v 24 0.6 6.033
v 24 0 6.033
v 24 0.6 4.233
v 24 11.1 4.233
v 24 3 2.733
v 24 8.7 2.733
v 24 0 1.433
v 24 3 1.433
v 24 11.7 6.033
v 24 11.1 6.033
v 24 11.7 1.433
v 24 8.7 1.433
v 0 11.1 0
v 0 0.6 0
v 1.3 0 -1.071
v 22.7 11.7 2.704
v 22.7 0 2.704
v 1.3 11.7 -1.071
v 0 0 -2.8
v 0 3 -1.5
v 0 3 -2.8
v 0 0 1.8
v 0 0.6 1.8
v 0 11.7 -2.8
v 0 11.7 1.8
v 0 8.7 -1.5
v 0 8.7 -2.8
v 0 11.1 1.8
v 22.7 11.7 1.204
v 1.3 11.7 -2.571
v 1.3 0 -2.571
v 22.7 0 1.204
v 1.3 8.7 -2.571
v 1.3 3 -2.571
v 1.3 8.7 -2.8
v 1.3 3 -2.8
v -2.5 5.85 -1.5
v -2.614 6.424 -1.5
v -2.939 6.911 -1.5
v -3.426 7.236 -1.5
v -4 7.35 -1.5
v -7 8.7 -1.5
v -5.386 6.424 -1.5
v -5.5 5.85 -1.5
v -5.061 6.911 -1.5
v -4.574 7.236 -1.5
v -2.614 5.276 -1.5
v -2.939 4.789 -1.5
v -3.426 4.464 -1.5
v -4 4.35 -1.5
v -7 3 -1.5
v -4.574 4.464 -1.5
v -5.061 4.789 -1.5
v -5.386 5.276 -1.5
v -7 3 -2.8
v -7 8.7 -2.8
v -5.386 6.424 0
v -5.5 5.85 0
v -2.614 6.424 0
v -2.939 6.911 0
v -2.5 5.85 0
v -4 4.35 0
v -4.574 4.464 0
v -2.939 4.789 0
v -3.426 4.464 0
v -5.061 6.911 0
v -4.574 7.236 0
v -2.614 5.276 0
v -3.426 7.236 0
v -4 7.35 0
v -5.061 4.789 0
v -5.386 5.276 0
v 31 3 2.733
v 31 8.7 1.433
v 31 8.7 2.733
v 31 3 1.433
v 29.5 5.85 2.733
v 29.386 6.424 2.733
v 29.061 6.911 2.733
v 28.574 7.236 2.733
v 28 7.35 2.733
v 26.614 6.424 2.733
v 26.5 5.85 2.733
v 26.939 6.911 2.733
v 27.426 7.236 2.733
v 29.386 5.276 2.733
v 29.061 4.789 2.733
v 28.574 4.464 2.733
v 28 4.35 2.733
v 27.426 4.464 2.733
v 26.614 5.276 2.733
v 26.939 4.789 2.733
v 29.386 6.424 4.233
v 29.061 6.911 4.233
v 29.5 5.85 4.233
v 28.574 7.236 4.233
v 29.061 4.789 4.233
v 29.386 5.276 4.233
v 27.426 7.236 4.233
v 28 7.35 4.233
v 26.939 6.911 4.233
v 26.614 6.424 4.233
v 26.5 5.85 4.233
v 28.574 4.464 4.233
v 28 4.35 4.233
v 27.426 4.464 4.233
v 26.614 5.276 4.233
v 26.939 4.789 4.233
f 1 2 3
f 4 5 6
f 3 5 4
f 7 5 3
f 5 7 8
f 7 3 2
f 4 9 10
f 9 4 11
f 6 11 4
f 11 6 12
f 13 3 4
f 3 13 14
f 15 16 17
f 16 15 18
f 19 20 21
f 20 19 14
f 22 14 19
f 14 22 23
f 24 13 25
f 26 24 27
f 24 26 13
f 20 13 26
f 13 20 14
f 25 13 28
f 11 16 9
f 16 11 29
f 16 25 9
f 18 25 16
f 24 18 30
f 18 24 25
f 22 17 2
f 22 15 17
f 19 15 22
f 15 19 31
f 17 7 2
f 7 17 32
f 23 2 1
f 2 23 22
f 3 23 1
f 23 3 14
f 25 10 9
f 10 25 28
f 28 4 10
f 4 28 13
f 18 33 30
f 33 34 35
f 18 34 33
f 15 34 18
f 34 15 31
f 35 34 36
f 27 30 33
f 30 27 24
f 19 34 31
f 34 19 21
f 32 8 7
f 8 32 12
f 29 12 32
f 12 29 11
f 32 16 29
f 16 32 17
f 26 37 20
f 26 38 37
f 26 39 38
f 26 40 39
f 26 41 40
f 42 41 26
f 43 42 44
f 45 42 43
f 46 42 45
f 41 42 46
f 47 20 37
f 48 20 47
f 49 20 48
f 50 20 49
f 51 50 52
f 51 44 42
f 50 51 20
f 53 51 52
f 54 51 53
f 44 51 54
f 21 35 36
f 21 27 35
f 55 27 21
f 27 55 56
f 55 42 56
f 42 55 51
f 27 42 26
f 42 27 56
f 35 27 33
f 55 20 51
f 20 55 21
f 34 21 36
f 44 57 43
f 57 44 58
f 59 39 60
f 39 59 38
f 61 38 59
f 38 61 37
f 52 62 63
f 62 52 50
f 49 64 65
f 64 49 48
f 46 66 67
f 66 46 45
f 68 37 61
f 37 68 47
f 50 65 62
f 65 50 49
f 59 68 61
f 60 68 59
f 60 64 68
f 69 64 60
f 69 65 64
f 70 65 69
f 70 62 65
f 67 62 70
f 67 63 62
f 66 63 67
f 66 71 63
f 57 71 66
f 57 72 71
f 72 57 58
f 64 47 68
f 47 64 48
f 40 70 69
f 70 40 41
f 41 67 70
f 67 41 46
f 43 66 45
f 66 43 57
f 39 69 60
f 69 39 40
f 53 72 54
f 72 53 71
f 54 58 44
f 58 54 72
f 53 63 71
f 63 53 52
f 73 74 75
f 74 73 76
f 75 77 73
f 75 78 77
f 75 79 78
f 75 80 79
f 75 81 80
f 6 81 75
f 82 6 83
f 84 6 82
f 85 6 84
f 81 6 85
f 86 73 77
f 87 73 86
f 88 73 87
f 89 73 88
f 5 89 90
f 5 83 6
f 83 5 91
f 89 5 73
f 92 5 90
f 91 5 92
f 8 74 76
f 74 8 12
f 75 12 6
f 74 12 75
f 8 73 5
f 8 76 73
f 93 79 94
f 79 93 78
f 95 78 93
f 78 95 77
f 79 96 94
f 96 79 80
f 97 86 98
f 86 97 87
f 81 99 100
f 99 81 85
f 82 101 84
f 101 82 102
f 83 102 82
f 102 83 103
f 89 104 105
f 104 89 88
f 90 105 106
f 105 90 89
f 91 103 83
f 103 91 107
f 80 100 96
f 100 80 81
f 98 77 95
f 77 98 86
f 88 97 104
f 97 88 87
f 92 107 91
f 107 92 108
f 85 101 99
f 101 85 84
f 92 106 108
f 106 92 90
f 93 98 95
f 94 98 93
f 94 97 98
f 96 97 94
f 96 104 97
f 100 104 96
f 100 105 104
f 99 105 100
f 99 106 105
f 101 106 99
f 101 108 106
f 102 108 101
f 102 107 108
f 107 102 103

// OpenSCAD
WS = 0.3;   // pixel to mm
TH = 1.3 / WS;   // minimum thickness
TH2 = 0.6 / WS;

l1 = 128.36;
l2 = 142.47;
w = 39;
d = 80;
h = abs(l2 - l1);
cw = max(w - 6 / WS, 4 / WS);
cl = 7 / WS;

scale([WS, WS, WS]) {
  // body
  multmatrix([
    [1, 0, 0, 0],
    [0, 1, 0, 0],
    [(l2 - l1) / d, 0, 1, 0],
    [0, 0, 0, 1]
  ]) {
    translate([0, 0, -TH]) cube([d, w, TH]);
    cube([d, TH2, 6]);
    translate([0, w - TH2, 0]) cube([d, TH2, 6]);
    translate([0, 0, -(TH + 1.5/WS)]) cube([TH, w, TH + 1.5/WS]);
    translate([d - TH, 0, -(TH + 1.5/WS)]) cube([TH, w, TH + 1.5/WS]);
  }

  // connector 1
  translate([-cl, (w - cw) / 2, -(TH + 1.5/WS)]) cube([cl+TH, cw, TH]);
  translate([-4/WS, w/2, -1.7/WS]) cylinder(r=1.5/WS, h=1.7/WS);

  // connector 2
  translate([d - TH, (w - cw) / 2, l2 - l1 - (TH + 1.5/WS)]) cube([cl+TH, cw, TH]);
  translate([d + 4/WS, w/2, l2 - l1 - 1.7/WS]) cylinder(r=1.5/WS, h=1.7/WS);
}
